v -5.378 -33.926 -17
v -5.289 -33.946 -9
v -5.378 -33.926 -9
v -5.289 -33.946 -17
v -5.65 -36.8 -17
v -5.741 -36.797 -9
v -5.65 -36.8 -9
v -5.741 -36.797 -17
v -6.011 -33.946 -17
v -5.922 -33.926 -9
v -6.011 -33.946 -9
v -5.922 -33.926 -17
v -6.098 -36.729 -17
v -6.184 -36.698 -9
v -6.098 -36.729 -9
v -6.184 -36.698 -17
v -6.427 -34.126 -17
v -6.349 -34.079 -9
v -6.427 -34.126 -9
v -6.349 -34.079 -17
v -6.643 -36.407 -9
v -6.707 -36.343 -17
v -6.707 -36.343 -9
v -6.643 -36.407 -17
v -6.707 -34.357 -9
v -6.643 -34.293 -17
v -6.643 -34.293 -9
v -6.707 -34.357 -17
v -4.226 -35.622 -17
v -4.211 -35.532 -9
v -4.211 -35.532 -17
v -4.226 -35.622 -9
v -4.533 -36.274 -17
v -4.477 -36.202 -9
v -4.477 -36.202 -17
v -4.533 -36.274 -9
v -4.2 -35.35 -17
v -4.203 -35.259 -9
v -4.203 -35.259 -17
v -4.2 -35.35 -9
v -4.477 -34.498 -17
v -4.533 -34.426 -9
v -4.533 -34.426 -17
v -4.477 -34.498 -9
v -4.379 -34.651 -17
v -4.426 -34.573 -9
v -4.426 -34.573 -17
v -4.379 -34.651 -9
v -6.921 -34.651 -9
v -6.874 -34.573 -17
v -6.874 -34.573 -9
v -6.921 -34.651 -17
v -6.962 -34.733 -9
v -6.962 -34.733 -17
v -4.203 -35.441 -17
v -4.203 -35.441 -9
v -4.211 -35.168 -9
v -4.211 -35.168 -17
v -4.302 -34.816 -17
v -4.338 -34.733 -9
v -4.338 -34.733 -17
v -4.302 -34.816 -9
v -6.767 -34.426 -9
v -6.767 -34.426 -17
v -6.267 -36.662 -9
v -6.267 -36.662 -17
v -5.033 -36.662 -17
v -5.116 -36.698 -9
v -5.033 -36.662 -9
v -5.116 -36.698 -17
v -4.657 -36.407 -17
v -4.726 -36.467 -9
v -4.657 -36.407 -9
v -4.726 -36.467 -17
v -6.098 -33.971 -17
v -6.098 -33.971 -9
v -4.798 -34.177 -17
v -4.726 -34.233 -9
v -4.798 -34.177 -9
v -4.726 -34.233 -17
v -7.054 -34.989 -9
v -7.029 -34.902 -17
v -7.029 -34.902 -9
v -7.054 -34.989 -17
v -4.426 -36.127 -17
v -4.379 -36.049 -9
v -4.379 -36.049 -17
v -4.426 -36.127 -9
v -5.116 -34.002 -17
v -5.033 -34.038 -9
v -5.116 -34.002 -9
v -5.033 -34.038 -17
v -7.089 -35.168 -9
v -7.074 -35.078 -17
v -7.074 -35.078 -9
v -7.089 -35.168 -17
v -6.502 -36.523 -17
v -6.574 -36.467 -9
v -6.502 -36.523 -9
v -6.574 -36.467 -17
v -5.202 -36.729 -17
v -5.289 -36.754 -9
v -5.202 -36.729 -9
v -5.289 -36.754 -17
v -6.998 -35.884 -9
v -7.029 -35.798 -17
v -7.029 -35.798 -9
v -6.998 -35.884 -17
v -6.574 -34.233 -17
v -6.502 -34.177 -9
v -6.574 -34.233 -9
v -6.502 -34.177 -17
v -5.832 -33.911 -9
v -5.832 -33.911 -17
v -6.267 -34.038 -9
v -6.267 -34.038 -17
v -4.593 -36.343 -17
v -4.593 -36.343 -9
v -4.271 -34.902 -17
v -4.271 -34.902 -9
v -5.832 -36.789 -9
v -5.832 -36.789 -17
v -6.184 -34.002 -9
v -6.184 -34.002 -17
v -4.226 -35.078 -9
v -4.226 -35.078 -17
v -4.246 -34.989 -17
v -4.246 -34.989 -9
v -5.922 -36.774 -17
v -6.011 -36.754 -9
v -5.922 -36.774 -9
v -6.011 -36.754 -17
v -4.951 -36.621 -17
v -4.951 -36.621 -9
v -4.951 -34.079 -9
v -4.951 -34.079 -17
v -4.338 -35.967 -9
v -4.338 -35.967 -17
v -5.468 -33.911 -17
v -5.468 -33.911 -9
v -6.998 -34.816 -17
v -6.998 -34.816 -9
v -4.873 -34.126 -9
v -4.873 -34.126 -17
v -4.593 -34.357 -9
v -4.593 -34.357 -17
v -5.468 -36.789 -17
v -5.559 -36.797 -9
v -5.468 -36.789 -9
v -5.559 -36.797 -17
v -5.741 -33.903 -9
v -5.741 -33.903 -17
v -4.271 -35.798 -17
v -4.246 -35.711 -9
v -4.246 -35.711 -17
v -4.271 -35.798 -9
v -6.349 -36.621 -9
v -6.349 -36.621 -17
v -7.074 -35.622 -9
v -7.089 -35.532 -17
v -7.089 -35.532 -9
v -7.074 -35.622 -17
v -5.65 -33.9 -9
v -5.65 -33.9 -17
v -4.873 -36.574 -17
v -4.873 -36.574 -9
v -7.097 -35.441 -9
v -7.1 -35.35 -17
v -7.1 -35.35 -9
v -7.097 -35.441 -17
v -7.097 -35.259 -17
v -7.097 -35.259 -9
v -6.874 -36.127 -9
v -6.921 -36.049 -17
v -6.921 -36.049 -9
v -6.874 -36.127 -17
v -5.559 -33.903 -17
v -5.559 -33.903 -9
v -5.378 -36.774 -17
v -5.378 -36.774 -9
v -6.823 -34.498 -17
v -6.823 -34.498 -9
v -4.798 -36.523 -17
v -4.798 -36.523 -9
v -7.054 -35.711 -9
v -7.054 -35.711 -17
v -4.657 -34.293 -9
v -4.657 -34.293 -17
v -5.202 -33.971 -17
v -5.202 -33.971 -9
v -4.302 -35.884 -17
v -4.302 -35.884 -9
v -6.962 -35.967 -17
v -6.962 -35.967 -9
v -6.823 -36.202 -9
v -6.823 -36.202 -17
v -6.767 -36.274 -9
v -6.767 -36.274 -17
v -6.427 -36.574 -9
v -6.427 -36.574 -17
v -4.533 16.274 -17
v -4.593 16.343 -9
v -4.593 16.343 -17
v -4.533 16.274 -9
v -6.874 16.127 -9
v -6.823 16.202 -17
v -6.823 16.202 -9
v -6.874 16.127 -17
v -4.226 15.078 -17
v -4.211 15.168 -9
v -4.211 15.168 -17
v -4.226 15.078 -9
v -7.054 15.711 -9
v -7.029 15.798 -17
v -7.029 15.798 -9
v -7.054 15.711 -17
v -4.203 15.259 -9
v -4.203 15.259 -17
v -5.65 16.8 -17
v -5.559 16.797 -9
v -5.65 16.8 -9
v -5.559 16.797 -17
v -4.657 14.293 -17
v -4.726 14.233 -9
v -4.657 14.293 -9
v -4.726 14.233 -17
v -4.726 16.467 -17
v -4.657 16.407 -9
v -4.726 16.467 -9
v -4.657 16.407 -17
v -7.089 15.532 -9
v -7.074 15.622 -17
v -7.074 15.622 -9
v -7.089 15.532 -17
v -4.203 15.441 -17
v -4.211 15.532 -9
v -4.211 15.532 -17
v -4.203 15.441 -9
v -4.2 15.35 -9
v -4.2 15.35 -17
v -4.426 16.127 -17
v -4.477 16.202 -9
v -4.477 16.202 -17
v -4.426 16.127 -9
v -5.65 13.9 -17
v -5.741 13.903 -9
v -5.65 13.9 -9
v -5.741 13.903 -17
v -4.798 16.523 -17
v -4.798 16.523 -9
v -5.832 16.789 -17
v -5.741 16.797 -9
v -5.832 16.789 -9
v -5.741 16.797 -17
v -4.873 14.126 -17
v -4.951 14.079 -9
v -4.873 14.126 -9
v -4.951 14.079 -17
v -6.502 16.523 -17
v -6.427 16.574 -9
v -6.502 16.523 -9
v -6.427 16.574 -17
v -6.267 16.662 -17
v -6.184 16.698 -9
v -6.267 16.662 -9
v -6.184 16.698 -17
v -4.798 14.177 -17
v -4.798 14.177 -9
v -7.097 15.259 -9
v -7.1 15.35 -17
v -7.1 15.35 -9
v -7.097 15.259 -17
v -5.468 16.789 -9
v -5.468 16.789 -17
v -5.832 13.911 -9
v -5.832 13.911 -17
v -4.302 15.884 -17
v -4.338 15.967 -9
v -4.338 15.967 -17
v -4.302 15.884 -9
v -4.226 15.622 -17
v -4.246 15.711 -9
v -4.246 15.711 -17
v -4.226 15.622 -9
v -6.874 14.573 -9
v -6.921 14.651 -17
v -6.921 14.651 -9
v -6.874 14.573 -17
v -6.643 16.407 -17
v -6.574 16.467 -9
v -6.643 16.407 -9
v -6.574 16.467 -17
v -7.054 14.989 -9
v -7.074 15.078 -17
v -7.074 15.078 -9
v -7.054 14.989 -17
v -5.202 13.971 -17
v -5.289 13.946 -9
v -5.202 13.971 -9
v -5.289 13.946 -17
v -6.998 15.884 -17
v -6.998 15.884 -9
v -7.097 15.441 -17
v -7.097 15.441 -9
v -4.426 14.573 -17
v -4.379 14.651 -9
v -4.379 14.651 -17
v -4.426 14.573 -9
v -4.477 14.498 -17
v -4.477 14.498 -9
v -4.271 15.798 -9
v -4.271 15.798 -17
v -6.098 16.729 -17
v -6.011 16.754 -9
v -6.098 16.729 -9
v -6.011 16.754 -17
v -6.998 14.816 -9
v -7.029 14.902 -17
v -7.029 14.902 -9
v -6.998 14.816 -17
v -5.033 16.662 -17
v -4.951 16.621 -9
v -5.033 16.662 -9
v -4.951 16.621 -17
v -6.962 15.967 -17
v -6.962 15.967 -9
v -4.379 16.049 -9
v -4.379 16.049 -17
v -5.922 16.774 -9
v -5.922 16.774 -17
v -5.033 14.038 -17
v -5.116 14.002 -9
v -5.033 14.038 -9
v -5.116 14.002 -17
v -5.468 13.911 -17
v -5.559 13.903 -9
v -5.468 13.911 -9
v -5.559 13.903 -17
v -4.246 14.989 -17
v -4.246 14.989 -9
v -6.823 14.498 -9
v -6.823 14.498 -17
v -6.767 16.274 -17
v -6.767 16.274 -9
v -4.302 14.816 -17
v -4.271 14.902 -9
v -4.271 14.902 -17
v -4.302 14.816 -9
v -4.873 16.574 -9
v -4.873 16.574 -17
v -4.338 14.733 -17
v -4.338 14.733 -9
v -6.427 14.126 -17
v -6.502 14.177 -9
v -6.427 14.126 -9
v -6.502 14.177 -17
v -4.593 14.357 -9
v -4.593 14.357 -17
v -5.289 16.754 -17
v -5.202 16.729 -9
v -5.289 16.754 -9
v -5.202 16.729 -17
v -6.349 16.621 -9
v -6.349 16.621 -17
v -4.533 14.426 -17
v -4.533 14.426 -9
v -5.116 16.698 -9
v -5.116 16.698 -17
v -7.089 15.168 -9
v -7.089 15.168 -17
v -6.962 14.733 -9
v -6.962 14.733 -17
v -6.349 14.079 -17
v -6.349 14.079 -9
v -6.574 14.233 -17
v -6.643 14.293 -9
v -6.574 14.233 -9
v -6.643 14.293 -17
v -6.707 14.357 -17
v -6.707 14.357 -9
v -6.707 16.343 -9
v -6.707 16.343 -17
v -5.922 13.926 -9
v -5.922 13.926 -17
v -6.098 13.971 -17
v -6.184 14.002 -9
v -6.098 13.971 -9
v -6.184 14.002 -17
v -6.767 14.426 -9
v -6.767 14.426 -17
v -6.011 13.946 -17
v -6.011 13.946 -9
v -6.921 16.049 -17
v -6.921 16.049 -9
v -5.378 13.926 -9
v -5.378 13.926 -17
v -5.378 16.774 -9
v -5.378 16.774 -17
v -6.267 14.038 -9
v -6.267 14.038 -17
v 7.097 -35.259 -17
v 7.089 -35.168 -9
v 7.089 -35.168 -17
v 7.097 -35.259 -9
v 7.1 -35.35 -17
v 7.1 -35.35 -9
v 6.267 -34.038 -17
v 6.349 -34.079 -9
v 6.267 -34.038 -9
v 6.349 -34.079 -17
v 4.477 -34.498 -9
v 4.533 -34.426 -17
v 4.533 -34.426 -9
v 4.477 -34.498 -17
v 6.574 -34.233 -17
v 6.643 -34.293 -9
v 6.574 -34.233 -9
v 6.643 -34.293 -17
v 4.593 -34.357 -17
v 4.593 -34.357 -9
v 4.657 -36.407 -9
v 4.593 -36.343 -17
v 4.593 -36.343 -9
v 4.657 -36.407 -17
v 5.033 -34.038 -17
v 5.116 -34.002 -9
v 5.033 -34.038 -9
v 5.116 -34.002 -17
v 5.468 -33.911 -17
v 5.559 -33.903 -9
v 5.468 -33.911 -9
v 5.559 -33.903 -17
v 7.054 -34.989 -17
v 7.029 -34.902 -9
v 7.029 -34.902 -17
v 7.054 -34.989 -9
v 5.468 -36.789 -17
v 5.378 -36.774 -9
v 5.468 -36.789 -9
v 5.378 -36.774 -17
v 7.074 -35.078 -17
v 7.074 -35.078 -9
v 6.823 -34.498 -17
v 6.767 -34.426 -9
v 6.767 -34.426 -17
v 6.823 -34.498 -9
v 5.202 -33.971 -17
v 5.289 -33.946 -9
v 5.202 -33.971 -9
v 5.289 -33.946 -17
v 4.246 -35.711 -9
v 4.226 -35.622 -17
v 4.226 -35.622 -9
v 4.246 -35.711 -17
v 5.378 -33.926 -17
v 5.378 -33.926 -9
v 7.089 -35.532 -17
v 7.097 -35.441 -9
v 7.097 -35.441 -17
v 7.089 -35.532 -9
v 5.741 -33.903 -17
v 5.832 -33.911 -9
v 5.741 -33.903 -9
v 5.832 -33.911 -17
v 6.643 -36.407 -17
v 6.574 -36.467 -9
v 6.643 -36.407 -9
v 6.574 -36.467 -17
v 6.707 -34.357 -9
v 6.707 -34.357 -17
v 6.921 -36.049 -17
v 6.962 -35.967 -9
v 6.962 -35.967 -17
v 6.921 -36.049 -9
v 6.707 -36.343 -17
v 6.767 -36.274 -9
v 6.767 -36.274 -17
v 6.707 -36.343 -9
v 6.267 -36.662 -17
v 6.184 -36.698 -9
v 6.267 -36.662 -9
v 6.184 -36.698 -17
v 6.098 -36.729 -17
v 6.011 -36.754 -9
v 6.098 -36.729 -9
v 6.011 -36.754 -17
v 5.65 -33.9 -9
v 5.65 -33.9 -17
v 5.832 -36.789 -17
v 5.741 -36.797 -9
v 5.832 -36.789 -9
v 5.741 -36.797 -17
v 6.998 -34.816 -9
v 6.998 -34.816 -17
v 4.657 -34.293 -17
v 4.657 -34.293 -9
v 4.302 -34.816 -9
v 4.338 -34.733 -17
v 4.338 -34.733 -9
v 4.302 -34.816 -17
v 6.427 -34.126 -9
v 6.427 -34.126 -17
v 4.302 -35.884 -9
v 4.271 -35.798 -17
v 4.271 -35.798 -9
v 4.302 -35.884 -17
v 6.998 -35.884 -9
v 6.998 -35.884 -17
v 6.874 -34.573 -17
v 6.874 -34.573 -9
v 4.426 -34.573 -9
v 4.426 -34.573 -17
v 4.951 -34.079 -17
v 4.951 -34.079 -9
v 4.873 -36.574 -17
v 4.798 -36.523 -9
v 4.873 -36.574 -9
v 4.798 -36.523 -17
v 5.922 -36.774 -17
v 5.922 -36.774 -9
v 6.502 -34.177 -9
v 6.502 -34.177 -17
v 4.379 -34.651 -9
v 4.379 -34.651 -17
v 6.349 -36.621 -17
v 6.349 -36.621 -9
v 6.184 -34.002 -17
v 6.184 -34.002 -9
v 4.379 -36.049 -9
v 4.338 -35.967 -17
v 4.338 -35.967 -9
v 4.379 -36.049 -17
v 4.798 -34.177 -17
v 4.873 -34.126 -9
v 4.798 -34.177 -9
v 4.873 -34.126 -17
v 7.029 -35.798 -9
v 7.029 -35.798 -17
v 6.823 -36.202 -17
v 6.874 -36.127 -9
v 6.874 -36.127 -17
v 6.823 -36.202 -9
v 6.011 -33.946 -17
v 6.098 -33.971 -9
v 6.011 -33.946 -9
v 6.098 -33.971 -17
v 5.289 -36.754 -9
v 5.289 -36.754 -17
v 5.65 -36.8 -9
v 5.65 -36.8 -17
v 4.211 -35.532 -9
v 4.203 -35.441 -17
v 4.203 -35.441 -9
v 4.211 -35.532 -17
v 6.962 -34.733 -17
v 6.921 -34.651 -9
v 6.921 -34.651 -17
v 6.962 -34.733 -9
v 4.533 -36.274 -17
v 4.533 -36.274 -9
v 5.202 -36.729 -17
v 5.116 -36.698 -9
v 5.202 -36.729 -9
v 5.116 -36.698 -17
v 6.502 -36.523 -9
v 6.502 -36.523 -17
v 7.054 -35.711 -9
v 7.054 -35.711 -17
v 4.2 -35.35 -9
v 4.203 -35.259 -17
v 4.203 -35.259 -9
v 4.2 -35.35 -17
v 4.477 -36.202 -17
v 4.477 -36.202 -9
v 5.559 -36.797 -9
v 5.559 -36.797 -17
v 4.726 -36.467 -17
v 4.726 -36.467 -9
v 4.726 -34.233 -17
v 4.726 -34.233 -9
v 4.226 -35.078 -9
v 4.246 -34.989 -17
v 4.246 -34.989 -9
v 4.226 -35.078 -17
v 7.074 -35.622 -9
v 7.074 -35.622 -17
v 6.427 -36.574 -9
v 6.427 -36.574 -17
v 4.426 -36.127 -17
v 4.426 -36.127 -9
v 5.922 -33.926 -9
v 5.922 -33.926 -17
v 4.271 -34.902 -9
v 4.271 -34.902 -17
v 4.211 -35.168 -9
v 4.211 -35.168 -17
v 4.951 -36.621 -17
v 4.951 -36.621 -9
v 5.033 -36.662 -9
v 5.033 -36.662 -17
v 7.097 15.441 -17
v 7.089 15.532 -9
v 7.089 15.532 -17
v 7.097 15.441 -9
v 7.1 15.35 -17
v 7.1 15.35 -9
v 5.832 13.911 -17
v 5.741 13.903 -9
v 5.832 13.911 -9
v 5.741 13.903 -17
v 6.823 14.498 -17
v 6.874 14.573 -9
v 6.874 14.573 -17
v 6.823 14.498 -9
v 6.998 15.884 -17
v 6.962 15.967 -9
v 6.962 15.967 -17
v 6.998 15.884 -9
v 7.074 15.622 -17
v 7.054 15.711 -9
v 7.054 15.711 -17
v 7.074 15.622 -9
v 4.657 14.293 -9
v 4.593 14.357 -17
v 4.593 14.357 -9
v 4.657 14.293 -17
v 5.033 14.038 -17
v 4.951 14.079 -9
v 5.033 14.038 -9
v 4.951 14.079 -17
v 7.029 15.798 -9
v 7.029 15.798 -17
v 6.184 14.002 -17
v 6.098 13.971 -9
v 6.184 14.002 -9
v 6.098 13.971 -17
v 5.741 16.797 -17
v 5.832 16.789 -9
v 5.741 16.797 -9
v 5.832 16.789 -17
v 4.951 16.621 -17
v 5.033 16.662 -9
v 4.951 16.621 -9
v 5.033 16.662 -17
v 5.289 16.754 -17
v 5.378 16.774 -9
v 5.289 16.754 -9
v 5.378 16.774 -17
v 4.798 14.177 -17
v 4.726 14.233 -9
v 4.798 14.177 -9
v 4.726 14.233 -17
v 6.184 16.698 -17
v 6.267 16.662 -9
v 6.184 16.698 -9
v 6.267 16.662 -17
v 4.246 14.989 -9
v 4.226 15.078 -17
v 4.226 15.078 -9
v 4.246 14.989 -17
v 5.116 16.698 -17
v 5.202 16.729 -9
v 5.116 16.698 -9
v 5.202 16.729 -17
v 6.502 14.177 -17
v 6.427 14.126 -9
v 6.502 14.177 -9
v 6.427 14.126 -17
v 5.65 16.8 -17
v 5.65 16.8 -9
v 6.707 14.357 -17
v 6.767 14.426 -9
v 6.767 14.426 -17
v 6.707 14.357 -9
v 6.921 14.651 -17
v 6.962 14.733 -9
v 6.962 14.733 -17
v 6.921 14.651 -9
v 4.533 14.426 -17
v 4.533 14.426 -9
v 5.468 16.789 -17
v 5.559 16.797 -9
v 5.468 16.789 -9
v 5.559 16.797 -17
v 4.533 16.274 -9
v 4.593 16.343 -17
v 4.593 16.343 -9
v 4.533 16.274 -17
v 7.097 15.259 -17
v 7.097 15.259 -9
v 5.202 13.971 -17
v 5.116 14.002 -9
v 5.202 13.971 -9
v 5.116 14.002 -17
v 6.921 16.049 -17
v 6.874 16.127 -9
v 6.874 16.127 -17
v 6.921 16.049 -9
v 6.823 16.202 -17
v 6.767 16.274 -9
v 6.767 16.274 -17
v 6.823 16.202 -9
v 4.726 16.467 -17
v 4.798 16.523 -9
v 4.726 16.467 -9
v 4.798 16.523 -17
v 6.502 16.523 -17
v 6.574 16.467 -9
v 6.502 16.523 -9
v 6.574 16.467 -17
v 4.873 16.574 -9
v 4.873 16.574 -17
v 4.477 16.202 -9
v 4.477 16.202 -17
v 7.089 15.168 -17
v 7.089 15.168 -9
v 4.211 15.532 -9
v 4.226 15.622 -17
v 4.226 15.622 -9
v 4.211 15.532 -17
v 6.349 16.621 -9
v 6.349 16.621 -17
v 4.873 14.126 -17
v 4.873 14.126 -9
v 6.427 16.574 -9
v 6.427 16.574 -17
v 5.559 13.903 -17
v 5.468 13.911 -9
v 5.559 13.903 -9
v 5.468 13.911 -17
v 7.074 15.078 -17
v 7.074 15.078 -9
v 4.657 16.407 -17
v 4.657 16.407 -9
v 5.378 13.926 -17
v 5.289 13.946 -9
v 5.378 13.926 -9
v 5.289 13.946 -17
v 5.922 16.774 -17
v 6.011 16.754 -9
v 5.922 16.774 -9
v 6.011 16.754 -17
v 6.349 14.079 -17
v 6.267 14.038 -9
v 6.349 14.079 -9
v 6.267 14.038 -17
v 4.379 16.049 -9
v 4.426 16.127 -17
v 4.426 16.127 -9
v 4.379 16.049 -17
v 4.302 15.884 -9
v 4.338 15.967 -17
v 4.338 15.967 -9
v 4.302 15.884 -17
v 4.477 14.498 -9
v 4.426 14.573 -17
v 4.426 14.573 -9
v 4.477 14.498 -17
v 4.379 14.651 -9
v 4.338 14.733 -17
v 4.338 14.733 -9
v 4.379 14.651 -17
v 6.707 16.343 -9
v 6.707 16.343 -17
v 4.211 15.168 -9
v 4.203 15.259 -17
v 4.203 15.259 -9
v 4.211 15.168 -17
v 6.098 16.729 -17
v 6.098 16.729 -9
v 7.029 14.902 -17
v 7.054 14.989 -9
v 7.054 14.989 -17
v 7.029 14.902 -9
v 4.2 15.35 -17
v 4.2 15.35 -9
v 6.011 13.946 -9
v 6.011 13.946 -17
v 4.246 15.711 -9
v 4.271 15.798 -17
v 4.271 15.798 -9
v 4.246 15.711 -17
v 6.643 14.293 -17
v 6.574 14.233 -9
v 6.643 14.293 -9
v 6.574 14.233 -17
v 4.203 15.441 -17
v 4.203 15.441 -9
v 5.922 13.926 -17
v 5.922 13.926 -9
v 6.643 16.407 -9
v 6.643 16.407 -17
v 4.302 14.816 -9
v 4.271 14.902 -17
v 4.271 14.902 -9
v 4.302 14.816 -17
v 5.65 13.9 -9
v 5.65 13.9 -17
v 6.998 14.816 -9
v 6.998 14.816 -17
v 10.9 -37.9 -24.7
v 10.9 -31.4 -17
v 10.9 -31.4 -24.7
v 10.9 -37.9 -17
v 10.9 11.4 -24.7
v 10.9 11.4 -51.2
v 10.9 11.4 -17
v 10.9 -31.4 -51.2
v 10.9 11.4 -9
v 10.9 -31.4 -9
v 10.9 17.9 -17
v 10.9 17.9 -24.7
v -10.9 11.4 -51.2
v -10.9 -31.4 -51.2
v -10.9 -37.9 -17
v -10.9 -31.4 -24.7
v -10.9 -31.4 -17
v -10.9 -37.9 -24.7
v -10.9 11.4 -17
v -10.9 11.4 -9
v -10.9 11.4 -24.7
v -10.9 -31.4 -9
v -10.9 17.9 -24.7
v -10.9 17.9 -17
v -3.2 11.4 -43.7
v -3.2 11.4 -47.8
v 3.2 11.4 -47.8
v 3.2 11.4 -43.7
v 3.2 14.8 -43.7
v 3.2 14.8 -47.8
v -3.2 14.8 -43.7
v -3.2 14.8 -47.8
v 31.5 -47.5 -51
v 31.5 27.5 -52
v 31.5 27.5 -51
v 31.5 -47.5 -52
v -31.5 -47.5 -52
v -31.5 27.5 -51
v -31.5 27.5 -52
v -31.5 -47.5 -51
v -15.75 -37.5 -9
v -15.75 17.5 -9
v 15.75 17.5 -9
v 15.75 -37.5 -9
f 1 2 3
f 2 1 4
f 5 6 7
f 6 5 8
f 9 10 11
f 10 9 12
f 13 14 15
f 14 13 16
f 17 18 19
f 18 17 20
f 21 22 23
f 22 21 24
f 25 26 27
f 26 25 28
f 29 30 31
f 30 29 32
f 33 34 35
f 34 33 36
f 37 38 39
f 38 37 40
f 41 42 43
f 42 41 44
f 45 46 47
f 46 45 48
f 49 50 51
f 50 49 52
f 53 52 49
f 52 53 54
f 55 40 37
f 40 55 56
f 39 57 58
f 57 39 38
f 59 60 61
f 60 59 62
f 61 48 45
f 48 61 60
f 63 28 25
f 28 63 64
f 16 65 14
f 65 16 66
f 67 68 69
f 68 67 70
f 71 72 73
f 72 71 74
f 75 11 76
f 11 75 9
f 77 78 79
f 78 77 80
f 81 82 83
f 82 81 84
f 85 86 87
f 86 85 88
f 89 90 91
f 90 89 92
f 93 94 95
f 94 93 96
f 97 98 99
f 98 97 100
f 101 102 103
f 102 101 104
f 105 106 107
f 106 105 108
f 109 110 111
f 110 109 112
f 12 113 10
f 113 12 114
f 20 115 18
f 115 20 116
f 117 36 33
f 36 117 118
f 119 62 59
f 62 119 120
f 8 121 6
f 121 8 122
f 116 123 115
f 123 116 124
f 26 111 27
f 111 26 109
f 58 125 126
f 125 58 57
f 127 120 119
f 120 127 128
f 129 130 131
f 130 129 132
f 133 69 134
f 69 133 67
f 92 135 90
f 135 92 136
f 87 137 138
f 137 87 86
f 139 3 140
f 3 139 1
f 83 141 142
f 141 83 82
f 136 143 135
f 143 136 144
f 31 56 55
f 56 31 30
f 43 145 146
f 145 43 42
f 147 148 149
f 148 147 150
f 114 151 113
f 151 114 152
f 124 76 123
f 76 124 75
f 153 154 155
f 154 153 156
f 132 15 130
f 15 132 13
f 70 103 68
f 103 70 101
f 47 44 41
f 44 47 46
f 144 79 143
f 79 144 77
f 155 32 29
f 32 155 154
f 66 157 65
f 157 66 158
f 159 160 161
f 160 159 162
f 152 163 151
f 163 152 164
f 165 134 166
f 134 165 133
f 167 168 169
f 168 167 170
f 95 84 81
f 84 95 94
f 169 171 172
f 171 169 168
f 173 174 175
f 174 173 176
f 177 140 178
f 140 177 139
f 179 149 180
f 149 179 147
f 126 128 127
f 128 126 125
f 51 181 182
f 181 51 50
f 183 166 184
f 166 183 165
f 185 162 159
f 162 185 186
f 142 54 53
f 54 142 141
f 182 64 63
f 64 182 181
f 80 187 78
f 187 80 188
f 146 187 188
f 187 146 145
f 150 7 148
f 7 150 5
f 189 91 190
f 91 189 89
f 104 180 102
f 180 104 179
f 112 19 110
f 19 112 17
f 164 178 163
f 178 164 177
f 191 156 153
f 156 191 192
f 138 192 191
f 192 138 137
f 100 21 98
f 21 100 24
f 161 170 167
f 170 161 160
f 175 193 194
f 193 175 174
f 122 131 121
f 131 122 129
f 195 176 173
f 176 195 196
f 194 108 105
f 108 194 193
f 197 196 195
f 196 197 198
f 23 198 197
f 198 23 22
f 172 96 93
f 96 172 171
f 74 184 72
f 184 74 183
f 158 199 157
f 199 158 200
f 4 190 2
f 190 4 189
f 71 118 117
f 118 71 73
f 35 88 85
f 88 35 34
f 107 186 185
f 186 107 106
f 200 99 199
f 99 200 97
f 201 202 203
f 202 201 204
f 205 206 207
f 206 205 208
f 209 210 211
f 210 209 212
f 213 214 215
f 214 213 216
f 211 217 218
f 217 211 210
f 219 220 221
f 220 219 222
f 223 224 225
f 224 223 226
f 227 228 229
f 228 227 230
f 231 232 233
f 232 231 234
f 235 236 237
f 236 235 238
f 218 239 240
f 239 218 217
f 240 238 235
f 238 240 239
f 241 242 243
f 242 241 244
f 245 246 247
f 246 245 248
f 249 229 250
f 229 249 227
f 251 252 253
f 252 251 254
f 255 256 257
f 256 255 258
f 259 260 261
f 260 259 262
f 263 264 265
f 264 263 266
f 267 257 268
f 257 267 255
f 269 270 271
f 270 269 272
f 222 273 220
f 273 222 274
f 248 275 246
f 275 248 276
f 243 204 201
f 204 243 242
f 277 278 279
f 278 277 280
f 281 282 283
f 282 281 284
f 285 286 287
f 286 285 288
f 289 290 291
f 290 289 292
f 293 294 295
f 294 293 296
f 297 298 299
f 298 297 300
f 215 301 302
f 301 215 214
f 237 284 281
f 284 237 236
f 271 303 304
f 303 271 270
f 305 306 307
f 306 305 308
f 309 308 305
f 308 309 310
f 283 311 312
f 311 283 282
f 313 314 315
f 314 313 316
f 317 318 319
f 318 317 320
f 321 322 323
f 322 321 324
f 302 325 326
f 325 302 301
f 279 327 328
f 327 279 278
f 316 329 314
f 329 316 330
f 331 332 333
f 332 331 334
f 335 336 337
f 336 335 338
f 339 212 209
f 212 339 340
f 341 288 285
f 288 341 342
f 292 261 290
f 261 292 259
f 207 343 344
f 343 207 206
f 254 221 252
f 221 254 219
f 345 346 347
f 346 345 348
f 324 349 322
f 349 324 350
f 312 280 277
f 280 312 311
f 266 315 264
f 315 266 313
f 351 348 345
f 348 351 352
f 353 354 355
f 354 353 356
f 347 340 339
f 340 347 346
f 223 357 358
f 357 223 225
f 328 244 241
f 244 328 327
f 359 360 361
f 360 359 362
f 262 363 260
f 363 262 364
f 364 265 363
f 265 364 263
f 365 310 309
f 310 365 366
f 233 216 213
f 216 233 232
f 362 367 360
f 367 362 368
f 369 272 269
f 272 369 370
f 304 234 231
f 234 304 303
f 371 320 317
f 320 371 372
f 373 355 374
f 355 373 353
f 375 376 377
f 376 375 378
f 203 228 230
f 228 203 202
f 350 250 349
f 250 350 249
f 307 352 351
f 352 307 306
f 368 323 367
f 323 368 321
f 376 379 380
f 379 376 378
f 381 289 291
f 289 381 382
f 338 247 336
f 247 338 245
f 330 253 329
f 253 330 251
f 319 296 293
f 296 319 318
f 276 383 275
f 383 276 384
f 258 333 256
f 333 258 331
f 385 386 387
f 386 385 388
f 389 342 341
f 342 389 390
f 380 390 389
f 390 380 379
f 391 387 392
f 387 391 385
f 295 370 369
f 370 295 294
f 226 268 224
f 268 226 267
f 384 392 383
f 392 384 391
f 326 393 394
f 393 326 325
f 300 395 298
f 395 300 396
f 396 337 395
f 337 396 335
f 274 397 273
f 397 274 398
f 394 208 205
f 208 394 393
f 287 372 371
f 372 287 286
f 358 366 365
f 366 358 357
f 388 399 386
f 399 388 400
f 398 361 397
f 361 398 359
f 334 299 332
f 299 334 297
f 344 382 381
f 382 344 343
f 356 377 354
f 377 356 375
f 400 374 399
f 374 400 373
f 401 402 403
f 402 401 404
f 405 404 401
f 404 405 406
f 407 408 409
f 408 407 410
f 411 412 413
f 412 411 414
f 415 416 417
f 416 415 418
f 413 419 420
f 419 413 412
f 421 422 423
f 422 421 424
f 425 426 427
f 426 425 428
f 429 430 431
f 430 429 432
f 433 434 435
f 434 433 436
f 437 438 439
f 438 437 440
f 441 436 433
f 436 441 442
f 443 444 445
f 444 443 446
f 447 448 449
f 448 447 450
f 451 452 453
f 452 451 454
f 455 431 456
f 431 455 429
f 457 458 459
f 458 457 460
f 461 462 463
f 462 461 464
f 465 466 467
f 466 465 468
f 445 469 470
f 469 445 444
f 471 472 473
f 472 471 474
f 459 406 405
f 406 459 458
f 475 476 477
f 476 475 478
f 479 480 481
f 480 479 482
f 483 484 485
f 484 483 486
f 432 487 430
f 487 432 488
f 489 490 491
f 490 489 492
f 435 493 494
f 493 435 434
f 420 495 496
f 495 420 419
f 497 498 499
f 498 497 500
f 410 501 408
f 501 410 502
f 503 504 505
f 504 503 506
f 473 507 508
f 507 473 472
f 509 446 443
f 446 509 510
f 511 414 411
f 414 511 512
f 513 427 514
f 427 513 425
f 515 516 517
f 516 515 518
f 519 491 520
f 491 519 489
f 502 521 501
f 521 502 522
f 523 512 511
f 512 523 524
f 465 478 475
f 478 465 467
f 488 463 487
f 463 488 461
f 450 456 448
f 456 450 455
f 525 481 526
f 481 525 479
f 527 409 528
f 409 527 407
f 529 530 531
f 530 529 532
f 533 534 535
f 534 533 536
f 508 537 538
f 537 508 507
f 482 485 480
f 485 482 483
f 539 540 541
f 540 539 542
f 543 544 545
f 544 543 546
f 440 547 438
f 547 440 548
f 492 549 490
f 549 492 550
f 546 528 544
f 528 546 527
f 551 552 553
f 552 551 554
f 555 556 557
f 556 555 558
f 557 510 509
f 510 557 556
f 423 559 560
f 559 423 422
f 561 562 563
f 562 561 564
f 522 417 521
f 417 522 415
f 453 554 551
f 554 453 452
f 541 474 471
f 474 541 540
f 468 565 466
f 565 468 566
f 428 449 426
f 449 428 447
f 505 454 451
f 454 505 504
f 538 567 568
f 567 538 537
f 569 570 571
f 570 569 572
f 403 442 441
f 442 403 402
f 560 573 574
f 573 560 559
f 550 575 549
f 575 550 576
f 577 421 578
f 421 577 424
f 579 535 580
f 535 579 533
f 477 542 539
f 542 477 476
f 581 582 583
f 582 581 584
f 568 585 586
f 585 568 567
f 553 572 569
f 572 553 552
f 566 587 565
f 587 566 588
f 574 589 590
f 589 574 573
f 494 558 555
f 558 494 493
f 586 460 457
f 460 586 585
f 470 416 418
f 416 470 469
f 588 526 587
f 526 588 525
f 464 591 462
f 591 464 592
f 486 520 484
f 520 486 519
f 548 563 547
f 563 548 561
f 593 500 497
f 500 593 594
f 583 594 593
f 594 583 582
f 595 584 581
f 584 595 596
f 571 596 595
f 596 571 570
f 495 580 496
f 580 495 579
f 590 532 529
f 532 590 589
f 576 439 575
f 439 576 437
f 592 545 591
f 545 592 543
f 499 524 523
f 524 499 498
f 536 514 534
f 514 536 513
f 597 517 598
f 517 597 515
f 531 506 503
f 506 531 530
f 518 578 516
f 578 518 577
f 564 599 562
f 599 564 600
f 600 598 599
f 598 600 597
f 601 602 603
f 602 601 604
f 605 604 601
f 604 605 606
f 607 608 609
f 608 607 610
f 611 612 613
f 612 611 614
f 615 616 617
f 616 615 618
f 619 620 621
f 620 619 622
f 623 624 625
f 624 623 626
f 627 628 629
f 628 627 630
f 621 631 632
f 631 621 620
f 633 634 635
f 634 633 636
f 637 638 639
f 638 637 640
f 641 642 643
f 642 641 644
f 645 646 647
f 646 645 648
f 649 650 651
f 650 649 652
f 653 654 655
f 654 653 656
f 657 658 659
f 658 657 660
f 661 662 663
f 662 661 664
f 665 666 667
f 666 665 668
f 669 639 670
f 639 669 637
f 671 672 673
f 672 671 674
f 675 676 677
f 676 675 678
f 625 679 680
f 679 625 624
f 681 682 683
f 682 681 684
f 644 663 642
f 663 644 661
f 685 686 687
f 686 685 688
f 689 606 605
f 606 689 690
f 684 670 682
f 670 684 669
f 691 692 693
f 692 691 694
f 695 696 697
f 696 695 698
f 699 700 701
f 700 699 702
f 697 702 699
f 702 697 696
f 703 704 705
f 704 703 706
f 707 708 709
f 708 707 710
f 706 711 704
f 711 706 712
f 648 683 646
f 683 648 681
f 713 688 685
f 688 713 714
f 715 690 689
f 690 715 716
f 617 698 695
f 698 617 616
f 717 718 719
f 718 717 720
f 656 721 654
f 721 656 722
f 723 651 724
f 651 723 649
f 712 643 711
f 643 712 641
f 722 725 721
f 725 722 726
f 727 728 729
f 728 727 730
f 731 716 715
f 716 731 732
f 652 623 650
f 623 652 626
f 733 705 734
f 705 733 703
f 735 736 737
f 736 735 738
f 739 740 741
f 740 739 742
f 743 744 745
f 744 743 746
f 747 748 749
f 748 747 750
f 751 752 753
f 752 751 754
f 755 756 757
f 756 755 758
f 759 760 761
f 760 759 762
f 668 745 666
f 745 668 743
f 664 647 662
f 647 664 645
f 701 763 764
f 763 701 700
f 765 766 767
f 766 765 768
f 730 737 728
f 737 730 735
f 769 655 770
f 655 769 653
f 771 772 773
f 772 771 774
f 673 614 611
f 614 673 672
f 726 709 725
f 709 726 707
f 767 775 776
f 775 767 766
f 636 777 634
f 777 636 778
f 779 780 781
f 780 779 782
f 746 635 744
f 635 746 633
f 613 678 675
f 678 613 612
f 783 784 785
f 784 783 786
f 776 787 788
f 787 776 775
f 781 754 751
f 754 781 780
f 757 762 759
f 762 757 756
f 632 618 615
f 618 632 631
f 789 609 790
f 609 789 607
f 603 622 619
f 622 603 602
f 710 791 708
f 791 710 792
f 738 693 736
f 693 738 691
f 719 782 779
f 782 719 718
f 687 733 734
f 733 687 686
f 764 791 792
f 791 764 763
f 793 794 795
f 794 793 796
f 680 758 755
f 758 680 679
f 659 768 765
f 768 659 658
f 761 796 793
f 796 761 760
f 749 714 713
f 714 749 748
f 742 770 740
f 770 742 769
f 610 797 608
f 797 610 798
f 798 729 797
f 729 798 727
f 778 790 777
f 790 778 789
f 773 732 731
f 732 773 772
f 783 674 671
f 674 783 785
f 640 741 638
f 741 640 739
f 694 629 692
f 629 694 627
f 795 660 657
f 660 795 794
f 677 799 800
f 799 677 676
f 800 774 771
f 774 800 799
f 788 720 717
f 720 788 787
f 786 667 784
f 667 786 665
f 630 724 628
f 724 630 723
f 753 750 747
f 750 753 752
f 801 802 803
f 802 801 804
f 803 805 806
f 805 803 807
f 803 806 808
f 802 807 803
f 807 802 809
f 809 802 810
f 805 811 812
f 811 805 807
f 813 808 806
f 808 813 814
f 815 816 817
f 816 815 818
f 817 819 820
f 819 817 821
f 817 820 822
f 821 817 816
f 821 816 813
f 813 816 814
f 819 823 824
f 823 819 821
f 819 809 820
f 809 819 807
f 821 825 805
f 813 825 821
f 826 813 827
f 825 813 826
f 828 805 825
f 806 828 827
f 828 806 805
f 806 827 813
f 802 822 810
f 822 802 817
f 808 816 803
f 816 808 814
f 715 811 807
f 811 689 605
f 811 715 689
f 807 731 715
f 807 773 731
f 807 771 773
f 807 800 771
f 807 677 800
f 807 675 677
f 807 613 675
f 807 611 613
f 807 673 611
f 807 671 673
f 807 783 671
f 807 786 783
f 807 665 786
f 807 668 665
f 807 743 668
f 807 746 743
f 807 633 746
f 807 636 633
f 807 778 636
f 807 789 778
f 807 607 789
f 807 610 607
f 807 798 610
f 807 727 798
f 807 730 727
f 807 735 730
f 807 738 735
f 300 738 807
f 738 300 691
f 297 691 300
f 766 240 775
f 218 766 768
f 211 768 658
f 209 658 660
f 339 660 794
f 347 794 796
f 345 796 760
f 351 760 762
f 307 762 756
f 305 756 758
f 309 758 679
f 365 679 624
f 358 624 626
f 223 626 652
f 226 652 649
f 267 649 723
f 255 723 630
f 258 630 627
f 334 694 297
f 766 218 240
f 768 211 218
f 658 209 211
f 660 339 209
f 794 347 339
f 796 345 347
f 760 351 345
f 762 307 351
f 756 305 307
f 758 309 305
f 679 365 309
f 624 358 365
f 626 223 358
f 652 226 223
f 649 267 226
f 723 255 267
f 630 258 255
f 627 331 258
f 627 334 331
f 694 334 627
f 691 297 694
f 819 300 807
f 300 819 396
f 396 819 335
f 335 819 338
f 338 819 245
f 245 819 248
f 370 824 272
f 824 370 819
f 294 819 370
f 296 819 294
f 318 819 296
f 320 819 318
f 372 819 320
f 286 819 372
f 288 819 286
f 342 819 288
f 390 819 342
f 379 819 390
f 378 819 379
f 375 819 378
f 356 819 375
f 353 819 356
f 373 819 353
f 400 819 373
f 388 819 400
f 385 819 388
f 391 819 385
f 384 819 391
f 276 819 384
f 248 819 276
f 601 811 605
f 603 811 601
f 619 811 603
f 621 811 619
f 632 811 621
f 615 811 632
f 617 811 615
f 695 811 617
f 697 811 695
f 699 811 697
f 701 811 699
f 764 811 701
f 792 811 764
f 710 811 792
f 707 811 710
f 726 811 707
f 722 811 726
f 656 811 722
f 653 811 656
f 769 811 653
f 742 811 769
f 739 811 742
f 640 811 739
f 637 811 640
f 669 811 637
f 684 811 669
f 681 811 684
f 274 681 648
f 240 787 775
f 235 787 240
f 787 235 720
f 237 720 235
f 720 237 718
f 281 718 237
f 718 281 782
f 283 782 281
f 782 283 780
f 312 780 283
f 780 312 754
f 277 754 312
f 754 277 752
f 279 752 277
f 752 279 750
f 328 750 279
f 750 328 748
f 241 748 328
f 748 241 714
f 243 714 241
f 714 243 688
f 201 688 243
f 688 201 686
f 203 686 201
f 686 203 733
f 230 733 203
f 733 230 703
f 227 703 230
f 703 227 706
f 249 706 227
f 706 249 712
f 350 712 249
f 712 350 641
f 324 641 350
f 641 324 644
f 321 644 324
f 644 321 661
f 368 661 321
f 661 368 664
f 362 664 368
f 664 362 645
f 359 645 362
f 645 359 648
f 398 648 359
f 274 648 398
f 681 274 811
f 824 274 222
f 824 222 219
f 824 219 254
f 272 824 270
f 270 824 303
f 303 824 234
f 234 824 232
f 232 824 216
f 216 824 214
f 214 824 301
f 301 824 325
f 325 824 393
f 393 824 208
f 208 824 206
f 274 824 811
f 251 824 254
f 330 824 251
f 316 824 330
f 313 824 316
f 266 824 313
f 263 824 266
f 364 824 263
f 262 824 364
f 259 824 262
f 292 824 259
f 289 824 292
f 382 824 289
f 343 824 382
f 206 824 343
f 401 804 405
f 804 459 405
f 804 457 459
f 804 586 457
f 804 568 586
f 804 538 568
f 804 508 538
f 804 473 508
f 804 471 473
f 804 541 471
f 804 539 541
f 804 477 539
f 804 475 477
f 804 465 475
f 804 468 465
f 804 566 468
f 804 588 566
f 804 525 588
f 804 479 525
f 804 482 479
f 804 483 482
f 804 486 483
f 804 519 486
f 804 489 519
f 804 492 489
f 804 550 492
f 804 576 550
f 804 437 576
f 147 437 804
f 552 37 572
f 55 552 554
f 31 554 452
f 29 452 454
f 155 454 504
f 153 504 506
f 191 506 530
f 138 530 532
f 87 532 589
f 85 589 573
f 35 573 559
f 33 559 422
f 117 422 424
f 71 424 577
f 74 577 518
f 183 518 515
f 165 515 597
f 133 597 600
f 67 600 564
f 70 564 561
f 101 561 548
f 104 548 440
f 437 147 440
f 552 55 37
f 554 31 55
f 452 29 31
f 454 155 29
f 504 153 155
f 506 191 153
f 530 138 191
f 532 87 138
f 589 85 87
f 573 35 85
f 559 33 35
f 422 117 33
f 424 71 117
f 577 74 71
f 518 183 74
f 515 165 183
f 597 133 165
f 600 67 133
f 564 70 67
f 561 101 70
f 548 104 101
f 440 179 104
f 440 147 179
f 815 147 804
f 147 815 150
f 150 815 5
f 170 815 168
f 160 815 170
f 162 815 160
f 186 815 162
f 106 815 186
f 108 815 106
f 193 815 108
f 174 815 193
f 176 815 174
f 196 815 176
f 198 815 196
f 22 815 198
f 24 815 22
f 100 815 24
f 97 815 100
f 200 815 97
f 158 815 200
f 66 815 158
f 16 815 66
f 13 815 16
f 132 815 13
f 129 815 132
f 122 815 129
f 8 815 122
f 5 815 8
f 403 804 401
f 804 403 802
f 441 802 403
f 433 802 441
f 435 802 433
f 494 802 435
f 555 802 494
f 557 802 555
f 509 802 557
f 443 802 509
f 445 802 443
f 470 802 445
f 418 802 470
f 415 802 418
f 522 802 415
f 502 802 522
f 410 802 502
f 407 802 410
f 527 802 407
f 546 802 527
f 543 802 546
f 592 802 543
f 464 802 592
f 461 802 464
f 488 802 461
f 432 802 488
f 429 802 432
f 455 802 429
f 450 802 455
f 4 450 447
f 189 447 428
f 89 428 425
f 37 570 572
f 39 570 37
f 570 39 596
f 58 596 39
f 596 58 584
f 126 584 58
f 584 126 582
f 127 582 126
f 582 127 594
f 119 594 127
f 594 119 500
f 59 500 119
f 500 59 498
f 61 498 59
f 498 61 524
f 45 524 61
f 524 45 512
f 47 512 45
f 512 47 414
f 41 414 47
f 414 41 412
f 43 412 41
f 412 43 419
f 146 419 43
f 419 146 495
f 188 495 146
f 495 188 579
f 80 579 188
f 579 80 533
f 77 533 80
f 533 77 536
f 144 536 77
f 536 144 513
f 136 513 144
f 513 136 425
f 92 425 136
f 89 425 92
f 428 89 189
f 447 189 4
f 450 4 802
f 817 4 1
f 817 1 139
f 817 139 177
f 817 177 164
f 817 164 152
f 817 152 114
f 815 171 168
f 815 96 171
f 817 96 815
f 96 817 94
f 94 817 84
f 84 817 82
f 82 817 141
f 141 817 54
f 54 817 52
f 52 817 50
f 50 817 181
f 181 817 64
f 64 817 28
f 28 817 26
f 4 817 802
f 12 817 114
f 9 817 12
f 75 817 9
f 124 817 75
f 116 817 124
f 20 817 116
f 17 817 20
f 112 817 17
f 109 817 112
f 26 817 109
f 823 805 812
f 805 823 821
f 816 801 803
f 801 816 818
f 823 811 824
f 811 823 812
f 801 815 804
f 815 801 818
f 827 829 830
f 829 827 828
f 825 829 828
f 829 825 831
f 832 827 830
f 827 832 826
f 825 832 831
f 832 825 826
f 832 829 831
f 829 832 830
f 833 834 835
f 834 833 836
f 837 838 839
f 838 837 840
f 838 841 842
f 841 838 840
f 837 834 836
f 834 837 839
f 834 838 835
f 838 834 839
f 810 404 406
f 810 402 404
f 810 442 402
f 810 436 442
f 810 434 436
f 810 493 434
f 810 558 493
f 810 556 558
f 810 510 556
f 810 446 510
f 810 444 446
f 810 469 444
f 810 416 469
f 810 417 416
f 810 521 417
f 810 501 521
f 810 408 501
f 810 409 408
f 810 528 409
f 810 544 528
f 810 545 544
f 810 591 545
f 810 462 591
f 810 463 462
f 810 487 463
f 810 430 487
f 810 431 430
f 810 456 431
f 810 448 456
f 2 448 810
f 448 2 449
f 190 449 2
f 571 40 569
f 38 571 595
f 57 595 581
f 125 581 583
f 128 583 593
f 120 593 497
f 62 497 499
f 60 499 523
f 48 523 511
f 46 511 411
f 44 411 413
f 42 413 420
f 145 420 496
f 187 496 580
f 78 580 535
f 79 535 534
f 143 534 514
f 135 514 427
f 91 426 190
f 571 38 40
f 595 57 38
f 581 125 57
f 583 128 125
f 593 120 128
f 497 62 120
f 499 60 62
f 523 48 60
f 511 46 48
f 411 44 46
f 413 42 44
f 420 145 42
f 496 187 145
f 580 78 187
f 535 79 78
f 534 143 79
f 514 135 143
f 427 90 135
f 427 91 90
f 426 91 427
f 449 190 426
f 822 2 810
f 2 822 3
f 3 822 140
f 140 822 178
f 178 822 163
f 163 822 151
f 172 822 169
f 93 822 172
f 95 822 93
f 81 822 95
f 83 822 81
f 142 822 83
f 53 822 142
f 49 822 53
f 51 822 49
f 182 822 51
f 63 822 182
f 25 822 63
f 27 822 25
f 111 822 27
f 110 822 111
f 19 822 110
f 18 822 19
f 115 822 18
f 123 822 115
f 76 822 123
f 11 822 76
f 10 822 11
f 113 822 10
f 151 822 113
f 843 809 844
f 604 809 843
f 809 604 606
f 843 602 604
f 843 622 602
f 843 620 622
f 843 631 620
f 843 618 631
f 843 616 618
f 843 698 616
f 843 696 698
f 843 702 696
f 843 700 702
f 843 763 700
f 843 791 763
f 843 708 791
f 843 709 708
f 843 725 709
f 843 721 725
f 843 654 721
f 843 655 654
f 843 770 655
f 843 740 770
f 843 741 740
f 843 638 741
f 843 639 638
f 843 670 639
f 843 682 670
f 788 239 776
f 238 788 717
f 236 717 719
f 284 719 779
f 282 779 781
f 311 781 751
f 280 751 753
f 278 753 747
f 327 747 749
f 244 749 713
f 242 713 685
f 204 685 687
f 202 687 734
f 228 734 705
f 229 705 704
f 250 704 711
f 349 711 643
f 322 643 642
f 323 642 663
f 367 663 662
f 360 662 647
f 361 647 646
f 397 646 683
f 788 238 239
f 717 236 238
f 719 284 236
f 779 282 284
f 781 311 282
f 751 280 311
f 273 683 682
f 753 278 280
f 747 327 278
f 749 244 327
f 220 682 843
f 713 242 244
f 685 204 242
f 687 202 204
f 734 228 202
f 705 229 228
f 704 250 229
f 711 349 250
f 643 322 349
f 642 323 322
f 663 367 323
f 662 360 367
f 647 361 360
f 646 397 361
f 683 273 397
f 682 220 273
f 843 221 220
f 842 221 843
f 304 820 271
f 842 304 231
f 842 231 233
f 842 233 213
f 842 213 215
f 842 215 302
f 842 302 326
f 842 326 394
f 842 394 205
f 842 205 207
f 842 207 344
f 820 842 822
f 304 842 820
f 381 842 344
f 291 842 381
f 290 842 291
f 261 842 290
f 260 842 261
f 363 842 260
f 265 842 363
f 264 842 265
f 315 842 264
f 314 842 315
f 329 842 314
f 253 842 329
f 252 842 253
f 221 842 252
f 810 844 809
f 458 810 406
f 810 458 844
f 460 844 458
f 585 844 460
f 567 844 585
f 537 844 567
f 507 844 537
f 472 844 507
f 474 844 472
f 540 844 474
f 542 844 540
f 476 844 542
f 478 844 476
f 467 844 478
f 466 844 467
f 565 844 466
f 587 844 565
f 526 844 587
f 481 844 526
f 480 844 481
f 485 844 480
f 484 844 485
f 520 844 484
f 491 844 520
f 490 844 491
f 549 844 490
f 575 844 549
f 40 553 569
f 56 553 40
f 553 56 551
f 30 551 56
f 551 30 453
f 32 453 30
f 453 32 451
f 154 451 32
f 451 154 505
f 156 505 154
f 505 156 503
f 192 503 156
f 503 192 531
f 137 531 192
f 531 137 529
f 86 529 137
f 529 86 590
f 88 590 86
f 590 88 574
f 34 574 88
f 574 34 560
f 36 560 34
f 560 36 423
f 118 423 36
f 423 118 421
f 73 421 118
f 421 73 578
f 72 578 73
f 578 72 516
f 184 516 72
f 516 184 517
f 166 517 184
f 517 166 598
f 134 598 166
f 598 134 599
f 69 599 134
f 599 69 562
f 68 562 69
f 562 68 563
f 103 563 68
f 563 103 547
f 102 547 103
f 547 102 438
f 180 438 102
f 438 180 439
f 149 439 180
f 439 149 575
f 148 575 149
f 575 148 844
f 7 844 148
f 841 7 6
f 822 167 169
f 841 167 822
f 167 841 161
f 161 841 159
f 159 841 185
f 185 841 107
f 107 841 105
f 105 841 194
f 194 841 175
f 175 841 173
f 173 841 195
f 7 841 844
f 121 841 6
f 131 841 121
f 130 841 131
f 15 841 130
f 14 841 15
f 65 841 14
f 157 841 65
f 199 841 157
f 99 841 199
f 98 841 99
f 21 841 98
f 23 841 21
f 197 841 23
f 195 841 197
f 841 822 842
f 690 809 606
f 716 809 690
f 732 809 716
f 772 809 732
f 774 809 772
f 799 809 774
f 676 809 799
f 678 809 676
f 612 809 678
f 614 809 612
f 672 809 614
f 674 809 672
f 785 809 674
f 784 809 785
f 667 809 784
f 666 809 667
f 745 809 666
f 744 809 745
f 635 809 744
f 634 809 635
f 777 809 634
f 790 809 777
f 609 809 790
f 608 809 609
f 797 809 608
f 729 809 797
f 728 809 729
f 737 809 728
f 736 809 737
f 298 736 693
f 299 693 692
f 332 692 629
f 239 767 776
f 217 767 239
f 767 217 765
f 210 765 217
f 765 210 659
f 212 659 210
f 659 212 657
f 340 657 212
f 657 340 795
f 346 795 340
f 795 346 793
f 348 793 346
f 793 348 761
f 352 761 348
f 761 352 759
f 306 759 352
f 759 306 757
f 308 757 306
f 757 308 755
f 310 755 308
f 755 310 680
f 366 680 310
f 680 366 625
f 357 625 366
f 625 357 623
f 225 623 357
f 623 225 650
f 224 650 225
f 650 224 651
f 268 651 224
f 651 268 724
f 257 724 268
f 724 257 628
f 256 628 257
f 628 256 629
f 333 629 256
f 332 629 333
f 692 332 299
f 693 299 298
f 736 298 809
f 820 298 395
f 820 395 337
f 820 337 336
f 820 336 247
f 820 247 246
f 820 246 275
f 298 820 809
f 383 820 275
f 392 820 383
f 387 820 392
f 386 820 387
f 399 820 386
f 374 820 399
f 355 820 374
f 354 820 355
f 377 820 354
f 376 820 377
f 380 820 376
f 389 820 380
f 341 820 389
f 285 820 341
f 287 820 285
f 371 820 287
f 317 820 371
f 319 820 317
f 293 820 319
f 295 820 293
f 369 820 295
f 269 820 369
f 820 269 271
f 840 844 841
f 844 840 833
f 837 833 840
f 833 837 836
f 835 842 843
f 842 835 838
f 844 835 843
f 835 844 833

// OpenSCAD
use <../../Vitamins/Actuators/StandardServo/StandardServo_Vitamin.scad>

module myPart(){
	hull(){
		cube([StandardServoThickness()*3,StandardServoLength()+20,1]);
		translate([15.75,10,StandardServoHeight()]){
			cube([StandardServoThickness()*1.5,StandardServoLength(),1]);
		}
	}
}

module myBase(){
	difference(){
		translate([-31.5,-StandardServoLength()+7.5,-StandardServoHeight()-10]){
			myPart();
		}

		StandardServoMotor(true, 1, true, .4);
	}
}

myBase();
